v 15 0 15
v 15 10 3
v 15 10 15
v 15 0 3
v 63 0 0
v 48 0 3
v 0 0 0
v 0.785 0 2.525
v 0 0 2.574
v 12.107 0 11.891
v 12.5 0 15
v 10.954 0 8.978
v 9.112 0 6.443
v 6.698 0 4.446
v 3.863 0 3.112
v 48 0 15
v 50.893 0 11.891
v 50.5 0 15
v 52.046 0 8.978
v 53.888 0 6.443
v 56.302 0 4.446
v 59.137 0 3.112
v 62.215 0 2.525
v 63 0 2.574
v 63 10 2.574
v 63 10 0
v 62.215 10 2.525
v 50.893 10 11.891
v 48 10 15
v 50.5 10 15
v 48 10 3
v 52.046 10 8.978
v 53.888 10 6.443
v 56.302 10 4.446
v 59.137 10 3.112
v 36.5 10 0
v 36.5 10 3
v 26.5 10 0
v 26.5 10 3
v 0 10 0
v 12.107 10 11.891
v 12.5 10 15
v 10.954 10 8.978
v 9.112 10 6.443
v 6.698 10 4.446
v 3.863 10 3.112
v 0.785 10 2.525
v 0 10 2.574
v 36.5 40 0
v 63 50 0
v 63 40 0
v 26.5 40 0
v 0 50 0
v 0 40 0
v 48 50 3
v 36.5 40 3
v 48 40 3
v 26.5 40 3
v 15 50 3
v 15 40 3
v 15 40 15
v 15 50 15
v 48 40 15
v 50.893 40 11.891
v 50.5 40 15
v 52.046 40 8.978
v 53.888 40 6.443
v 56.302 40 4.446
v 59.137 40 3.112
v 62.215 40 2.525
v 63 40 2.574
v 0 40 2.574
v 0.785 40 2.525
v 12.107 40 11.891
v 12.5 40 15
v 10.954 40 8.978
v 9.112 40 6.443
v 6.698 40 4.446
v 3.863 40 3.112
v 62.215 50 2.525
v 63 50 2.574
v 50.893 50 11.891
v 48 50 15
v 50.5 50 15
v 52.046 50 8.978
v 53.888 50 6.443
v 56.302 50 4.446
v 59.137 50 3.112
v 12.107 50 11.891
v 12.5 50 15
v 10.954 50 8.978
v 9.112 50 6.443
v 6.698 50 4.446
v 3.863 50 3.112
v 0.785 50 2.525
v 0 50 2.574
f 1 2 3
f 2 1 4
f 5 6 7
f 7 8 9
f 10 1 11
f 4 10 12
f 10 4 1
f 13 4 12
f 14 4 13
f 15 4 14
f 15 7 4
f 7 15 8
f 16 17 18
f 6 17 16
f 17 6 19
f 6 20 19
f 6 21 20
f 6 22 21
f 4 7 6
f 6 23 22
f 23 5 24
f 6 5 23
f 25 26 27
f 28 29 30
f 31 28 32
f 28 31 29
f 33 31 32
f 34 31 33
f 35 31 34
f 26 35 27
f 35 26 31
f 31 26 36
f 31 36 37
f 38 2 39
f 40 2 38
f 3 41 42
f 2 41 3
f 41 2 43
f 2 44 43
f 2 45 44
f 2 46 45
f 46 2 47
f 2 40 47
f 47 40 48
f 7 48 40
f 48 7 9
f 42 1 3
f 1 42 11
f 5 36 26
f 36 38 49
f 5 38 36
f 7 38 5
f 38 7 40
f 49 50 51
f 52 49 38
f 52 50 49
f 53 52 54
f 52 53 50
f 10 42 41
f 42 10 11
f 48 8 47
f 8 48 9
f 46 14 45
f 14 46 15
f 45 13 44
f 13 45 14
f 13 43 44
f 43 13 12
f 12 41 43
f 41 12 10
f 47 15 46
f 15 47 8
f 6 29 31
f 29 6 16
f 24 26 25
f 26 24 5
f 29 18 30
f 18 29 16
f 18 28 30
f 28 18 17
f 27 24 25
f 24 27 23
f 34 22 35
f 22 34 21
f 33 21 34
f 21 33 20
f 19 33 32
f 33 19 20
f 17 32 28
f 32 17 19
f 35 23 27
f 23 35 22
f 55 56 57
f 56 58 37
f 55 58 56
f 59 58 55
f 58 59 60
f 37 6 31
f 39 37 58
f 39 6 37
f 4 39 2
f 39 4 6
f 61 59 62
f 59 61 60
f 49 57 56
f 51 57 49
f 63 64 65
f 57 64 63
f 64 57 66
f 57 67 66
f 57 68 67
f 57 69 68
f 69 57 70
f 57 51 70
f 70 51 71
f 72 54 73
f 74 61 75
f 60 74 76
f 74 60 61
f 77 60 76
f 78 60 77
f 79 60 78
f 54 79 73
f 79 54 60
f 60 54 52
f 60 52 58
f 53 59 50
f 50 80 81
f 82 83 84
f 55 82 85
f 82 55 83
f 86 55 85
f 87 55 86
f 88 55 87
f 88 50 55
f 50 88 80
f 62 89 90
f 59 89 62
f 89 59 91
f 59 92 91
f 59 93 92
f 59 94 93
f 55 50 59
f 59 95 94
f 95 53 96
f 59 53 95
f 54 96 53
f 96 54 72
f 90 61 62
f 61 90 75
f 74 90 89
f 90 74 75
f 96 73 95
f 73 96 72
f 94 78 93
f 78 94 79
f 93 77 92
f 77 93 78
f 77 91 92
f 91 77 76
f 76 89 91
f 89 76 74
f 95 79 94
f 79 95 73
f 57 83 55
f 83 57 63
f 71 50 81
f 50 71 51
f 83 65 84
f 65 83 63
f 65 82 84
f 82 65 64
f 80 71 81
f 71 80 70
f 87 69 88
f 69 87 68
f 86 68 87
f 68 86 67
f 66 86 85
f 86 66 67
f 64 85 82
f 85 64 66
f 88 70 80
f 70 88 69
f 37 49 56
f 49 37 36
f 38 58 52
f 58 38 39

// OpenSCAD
//Width of the object that goes into the stand
width = 33; // [0:0.5:100]
//Length of the bridge between both feet
length = 30; // [0:0.5:100]
//Thickness of the feet
thickness = 10; // [1:0.5:100]

module side()
{
 difference()
 {
  translate([0,0,-thickness/2])
  cube([15, 15, thickness]);
  translate([0,15,0])
  cylinder(d=25, h=thickness+2, $fn=25, center=true);
 }
}

module end()
{
 translate([0, 0, thickness/2])
 side();

 translate([15-1, 0, 0])
 cube([width+2, 3, thickness]);

 translate([width, 0, 0])
 translate([30, 0, , thickness/2])
 mirror([1,0,0])
 side();
}

module model()
{
 translate([0,thickness,0])
 rotate([90,0,0])
 end();

 translate([15+width/2-thickness/2,thickness-1,0])
 cube([thickness, length+2, 3]);

 translate([0,thickness+length+thickness,0])
 rotate([90,0,0])
 end();
}

model();
